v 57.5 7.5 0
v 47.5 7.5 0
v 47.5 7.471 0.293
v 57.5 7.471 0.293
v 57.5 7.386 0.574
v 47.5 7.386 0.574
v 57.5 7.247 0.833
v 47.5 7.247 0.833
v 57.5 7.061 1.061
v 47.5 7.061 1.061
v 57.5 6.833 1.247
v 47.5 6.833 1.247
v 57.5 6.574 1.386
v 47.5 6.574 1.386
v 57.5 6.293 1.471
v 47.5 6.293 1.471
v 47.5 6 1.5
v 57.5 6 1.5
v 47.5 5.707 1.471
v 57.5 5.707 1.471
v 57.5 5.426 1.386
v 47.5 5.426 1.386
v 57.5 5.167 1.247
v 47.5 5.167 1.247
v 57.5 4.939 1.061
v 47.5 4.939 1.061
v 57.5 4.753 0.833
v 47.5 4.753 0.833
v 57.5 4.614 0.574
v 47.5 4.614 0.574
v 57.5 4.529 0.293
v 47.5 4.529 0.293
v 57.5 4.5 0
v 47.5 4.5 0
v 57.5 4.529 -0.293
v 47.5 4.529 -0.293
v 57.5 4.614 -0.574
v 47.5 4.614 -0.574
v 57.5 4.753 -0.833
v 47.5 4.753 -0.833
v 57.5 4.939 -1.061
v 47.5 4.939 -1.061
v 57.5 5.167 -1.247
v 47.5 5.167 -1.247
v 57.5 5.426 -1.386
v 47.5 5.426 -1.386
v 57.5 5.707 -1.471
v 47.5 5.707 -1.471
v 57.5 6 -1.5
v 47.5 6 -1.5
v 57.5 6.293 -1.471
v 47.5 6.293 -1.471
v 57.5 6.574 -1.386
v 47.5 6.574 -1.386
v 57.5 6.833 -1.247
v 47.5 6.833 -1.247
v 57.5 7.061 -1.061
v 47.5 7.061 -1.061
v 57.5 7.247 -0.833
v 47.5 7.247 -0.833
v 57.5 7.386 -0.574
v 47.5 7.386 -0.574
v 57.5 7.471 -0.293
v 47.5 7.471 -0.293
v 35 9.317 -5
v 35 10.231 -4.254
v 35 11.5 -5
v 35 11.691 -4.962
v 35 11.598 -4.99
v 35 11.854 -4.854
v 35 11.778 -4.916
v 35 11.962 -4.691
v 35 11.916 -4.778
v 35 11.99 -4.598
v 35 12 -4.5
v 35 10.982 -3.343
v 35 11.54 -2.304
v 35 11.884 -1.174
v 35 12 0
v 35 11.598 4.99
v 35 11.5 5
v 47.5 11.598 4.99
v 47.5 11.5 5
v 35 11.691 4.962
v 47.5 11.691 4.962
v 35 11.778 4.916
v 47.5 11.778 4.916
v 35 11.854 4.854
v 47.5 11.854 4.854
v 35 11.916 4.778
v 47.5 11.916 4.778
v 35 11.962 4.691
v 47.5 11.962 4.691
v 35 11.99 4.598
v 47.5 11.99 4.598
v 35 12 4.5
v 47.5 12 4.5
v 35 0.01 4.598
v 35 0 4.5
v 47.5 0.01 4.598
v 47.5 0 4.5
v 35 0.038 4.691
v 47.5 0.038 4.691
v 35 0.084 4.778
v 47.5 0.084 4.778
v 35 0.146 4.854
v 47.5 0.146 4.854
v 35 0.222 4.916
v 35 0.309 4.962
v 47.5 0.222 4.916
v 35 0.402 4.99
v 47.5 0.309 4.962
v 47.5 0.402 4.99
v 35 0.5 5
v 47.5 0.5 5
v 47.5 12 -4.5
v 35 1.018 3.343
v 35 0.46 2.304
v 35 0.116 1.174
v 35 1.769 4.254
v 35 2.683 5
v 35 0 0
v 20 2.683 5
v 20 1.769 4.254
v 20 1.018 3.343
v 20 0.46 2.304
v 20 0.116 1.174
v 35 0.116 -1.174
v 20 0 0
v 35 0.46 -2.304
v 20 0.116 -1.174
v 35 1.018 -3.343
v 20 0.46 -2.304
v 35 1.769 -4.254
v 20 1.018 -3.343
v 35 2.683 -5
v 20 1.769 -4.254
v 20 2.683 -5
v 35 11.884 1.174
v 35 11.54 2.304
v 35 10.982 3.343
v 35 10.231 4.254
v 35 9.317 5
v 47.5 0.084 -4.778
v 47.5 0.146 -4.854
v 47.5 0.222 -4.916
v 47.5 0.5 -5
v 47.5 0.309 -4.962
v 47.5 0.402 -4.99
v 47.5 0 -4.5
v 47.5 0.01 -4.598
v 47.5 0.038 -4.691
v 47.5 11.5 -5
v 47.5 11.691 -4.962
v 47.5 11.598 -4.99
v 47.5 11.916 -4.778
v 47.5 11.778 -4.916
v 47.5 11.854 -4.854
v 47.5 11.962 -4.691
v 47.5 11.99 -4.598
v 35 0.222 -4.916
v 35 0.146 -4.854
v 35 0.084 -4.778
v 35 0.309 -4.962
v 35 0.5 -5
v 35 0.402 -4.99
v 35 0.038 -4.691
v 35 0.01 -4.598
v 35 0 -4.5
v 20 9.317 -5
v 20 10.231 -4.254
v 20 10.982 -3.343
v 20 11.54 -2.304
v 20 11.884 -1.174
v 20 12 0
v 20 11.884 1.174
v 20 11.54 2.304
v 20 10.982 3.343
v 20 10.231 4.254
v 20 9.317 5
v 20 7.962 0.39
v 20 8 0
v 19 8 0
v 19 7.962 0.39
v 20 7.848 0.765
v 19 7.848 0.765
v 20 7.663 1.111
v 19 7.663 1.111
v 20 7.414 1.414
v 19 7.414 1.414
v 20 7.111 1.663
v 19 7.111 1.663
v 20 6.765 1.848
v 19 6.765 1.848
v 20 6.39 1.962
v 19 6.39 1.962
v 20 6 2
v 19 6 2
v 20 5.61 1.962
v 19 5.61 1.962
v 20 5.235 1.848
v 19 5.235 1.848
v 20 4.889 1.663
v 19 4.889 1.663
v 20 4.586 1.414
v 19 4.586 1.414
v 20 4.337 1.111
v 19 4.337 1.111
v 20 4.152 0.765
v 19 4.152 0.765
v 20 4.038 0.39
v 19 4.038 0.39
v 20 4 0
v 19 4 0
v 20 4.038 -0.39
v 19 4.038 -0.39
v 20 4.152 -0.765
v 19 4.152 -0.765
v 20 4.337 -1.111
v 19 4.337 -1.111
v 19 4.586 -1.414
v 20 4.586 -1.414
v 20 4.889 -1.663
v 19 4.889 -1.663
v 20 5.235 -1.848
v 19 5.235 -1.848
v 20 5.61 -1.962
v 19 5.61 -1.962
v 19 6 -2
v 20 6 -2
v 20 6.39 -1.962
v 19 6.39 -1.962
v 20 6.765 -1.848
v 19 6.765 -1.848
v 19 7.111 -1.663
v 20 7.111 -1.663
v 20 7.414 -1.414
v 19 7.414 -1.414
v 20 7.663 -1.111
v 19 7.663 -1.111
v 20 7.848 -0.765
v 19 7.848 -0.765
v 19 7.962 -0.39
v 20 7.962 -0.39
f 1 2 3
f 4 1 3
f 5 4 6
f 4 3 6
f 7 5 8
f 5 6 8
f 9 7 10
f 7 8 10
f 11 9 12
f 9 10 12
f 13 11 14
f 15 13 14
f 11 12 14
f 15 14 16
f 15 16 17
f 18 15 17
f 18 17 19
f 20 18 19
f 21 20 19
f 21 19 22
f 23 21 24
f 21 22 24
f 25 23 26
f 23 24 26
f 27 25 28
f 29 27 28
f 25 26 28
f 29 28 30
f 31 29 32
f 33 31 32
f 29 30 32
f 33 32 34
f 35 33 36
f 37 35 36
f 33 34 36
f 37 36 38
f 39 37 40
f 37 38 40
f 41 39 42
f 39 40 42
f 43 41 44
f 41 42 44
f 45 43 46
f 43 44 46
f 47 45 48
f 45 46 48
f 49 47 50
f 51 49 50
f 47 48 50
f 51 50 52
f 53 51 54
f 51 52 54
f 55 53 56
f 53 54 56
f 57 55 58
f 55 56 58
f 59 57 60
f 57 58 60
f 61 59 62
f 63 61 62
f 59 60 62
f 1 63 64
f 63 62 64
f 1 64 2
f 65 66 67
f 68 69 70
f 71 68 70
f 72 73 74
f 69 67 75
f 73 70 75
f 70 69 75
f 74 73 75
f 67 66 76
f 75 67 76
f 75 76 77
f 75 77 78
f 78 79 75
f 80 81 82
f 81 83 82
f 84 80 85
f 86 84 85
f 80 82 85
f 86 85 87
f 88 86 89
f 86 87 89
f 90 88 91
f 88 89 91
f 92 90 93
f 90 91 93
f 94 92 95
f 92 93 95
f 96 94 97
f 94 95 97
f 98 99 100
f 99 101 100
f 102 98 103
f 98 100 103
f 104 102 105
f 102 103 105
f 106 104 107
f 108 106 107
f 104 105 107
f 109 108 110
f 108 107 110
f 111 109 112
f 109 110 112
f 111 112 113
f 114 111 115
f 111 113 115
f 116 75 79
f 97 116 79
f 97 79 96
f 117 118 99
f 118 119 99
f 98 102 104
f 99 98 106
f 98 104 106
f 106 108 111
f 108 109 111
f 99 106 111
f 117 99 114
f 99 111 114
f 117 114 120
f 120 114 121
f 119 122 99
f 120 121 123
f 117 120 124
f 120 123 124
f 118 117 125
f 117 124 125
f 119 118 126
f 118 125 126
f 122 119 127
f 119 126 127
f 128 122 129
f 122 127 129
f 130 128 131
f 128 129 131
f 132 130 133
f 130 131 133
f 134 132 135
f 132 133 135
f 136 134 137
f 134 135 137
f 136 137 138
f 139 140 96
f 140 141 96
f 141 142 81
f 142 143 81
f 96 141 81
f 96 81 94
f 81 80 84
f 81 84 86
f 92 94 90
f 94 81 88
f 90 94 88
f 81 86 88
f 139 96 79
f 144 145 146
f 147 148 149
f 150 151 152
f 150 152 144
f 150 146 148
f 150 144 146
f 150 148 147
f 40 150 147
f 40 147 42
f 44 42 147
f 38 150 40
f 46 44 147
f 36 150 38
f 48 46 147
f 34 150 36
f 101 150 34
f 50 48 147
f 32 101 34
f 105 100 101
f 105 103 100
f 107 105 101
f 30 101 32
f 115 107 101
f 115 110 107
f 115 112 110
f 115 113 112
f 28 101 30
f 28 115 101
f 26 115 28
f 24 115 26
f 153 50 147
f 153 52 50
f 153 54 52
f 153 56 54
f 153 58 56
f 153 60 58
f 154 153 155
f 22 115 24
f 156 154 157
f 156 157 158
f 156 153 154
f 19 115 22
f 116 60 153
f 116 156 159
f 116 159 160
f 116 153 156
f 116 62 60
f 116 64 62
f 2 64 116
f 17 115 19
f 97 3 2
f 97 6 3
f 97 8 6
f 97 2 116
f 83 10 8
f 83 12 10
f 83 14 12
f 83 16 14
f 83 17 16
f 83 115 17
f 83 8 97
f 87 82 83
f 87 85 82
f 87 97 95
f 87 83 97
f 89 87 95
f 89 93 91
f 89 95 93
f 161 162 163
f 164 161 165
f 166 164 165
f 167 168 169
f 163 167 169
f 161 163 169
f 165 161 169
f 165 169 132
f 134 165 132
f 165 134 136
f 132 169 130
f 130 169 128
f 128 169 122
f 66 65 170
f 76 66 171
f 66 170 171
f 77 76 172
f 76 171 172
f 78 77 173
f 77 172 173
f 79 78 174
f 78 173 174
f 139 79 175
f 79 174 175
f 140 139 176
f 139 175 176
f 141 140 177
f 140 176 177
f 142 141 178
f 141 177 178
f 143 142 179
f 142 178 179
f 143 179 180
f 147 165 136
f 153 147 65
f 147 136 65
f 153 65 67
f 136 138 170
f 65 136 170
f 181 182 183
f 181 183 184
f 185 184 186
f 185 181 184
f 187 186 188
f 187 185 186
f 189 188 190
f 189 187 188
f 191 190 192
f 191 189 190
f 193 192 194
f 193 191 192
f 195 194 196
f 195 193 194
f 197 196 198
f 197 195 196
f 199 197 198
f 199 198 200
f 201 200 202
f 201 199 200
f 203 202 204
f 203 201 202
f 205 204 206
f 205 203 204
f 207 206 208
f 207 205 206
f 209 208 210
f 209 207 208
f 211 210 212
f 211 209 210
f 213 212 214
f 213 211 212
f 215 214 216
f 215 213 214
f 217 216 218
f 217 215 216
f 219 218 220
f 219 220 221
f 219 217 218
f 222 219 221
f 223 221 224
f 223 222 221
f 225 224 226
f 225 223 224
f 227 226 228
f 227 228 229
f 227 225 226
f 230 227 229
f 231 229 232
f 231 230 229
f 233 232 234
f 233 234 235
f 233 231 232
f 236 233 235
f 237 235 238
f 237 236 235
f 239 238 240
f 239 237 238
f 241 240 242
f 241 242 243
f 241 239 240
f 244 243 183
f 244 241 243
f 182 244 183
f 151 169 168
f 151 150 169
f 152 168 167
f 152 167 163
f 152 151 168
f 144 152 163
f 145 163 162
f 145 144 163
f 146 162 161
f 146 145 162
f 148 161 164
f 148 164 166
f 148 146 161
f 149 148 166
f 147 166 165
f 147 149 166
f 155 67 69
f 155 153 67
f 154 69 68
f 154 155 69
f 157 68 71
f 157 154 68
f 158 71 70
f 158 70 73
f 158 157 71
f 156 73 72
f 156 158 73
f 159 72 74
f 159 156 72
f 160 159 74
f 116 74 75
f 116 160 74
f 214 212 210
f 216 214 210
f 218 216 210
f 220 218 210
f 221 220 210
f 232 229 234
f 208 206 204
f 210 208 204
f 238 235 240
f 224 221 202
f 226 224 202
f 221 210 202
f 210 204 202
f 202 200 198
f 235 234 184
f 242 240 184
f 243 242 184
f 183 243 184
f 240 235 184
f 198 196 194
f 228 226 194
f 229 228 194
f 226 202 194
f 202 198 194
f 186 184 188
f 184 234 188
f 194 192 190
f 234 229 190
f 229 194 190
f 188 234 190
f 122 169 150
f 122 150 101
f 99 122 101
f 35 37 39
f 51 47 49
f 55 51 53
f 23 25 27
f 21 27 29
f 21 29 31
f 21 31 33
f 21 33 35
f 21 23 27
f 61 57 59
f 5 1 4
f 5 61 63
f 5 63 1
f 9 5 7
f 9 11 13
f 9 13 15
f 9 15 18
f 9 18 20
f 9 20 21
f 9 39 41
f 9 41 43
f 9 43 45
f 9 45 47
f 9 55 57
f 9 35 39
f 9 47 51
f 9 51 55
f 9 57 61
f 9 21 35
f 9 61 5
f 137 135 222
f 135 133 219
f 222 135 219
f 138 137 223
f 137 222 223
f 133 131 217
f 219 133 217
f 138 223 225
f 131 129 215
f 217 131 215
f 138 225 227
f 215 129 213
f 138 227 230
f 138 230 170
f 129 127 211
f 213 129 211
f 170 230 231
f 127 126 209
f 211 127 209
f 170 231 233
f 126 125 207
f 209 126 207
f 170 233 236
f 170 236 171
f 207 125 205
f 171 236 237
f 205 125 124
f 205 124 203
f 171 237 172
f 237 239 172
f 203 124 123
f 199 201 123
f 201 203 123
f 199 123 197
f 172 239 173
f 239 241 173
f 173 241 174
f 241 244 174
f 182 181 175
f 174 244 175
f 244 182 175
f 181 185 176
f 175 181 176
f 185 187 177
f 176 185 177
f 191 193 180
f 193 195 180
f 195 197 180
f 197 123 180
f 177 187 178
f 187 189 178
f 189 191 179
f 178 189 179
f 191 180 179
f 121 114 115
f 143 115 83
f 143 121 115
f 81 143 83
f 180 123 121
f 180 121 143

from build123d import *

# Parameters (mm, degrees)
PAD002_DEPTH = 15
SKETCH006_R  = 2
PAD003_DEPTH = 1
SKETCH007_W  = 12
SKETCH007_H  = 10
PAD004_DEPTH = 12.5
FILLET_R     = 0.5
SKETCH008_R  = 1.5
PAD005_DEPTH = 10


with BuildPart() as part:
    # Sketch005 → Pad002 (new body)
    with BuildSketch(Plane.YZ):
        with BuildLine():
            ThreePointArc((-3.316625, 5), (-6, 0), (-3.316625, -5))
            Line((-3.316625, -5), (3.316625, -5))
            ThreePointArc((3.316625, -5), (6, 0), (3.316625, 5))
            Line((-3.316625, 5), (3.316625, 5))
        make_face()
    extrude(amount=PAD002_DEPTH)

    # Sketch006 → Pad003 (join)
    with BuildSketch(Plane.YZ):
        Circle(SKETCH006_R)
    extrude(amount=-PAD003_DEPTH)

    # Sketch007 → Pad004 (join)
    with BuildSketch(Plane.YZ.offset(15)):
        Rectangle(SKETCH007_W, SKETCH007_H)
    extrude(amount=PAD004_DEPTH)

    # Fillet
    fillet_edges = [part.edges().sort_by_distance(p)[0] for p in [
        (21.25, -6, 5),
        (21.25, 6, 5),
        (21.25, -6, -5),
        (21.25, 6, -5),
    ]]
    fillet(fillet_edges, radius=FILLET_R)

    # Sketch008 → Pad005 (join)
    with BuildSketch(Plane.YZ.offset(27.5)):
        Circle(SKETCH008_R)
    extrude(amount=PAD005_DEPTH)


with BuildPart() as part_1:
    # Body002 placement: moved
    add(part.part.moved(Location((20, 6, 0))))


solid = part_1.part
